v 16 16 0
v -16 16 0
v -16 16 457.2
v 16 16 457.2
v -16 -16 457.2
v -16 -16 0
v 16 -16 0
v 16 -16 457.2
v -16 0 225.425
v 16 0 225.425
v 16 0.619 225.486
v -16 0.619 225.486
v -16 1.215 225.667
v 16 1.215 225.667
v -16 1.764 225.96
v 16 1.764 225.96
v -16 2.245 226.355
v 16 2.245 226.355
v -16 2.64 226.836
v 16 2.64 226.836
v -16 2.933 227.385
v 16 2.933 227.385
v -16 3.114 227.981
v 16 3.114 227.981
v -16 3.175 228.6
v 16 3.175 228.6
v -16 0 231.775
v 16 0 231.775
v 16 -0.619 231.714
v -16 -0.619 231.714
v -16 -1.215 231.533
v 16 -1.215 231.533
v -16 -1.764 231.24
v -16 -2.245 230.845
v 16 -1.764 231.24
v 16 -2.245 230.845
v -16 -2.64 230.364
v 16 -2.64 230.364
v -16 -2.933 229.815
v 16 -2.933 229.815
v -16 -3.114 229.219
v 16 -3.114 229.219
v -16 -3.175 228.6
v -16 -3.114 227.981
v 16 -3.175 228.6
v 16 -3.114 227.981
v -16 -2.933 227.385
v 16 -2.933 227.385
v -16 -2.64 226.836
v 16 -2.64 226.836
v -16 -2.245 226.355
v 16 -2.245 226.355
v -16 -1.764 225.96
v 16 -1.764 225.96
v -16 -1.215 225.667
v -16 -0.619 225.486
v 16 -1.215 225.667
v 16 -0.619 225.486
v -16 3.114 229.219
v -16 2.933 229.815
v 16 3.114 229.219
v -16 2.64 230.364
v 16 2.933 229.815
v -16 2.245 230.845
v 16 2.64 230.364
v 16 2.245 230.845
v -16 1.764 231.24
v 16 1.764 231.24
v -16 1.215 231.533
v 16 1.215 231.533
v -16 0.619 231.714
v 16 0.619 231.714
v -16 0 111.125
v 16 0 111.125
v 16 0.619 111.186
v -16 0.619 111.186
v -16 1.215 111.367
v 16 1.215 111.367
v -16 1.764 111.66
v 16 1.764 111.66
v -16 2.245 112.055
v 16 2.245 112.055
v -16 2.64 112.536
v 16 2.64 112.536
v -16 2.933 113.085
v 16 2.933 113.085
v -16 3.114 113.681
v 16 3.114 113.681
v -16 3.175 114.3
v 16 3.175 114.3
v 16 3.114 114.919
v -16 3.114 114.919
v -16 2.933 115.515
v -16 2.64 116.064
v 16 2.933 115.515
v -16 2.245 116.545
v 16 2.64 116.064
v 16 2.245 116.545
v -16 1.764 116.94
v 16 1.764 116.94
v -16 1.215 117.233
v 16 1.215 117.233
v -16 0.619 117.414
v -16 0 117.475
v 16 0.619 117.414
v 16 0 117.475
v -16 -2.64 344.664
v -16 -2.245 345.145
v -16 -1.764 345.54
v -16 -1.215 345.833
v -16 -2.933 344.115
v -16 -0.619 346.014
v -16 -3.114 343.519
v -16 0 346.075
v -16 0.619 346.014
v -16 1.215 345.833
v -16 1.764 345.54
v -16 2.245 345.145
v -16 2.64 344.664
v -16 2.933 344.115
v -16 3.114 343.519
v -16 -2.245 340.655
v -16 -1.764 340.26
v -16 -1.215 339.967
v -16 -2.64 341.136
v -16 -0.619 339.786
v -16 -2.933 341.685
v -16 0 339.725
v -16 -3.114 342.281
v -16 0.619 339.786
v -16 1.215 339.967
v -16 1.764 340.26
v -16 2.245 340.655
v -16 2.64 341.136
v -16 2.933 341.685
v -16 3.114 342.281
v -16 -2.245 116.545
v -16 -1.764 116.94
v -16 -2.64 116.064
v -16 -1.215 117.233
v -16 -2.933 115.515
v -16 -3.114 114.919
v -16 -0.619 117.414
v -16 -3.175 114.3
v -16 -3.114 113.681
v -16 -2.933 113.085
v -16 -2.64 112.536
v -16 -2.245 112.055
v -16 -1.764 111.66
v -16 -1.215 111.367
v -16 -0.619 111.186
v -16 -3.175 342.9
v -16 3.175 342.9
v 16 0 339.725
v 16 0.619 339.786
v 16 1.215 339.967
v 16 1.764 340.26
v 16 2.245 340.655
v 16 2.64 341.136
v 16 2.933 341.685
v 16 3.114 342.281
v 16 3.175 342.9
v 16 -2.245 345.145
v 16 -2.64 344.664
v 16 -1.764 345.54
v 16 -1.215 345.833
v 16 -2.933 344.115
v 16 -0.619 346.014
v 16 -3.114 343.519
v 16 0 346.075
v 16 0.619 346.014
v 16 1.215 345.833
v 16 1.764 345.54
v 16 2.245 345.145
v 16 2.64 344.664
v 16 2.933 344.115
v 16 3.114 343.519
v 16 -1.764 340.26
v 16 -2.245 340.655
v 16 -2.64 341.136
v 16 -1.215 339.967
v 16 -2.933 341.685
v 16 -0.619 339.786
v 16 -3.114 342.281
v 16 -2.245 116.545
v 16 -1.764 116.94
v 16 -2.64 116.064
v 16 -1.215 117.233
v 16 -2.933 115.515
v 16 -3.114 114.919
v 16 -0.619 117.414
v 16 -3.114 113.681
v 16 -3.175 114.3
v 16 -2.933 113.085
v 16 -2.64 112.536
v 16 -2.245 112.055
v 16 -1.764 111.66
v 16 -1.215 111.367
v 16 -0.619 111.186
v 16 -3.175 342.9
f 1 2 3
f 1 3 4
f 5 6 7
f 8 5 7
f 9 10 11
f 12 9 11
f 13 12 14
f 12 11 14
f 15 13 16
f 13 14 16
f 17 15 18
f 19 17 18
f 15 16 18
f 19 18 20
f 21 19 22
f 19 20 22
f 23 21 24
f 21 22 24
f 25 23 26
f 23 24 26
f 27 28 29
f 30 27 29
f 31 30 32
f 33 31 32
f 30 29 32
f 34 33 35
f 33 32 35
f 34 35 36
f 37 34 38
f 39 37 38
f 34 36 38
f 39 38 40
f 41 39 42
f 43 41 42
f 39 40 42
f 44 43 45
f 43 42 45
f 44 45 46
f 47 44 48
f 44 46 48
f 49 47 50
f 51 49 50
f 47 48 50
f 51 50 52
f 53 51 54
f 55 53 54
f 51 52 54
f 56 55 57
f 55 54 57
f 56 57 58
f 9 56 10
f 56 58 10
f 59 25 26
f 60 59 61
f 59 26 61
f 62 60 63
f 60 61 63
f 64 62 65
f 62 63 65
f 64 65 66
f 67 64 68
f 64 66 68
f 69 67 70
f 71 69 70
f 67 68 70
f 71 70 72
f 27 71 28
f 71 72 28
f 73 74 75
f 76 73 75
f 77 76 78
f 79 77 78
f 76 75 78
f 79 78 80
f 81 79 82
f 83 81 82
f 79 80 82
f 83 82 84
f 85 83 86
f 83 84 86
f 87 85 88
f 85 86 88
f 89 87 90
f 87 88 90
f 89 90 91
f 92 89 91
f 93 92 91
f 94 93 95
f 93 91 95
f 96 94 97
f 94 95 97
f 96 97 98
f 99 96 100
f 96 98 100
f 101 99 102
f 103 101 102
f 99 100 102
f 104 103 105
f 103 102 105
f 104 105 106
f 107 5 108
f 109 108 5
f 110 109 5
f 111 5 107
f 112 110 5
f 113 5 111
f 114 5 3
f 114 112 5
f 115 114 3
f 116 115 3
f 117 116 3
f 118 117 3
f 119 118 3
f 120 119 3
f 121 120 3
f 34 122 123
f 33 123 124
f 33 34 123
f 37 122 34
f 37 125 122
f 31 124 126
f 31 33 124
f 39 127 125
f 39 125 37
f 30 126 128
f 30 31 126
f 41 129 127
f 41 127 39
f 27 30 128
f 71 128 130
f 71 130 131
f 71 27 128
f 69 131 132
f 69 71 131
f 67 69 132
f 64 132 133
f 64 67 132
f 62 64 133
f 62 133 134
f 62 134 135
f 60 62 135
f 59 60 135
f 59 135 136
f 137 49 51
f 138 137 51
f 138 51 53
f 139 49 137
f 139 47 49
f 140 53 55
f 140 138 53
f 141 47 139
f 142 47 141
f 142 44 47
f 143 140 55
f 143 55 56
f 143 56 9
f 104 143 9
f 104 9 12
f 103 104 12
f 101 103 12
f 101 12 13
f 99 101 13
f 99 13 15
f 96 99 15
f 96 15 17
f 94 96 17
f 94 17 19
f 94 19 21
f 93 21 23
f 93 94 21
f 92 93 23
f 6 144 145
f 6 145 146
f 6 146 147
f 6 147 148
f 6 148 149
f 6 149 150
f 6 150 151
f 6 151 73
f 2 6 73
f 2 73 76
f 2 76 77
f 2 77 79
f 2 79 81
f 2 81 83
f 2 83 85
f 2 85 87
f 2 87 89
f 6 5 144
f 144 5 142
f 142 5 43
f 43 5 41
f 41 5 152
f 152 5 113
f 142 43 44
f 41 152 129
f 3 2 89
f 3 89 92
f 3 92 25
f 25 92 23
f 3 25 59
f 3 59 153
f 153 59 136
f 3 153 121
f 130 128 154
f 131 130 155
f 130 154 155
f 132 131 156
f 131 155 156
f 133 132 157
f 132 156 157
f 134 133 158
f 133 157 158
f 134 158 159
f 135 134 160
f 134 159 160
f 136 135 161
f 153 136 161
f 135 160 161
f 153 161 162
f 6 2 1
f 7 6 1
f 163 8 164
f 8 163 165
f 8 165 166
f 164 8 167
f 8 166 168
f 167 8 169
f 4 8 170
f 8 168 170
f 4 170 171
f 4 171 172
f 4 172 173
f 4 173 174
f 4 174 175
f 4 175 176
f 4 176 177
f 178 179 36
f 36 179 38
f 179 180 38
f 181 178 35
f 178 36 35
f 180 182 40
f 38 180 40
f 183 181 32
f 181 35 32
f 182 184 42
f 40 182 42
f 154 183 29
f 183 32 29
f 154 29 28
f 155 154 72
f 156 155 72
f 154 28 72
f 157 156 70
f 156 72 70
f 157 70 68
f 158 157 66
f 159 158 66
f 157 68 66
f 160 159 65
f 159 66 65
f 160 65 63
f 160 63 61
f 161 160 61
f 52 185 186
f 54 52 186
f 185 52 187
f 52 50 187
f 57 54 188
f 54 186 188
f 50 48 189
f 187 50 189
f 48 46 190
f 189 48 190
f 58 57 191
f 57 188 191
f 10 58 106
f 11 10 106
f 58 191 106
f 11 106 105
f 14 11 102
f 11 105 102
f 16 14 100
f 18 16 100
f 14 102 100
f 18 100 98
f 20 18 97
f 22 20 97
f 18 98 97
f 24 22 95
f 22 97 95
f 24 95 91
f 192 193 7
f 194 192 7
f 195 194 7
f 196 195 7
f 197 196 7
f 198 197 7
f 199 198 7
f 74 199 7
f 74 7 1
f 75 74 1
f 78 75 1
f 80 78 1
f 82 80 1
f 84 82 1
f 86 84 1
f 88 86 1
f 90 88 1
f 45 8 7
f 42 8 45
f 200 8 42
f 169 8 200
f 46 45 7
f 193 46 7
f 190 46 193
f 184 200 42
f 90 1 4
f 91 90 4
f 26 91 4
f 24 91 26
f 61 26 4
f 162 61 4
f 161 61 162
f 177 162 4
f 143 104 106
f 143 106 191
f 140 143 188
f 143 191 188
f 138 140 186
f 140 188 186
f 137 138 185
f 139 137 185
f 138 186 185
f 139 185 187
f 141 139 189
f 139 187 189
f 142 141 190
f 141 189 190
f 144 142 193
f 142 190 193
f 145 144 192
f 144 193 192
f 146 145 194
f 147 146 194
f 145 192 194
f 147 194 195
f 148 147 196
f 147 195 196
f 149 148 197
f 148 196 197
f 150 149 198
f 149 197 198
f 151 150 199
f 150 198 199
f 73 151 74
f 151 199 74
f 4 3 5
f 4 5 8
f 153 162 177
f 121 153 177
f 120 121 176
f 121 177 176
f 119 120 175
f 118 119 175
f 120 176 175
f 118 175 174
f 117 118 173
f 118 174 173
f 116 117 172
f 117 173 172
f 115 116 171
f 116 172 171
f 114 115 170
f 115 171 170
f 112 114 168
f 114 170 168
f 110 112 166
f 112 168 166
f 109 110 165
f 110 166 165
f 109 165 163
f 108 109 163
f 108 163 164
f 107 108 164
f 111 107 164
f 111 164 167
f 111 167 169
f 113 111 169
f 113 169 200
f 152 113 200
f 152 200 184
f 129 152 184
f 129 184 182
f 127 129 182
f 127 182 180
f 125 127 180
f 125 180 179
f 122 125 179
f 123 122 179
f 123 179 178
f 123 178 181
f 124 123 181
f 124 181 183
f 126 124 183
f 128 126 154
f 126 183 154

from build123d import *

# Parameters (mm, degrees)
F0_W     = 32
F0_H     = 32
F1_DEPTH = 457.2
F3_DEPTH = 32.001


with BuildPart() as f1:
    # F0 (on Top) → F1 (new body)
    with BuildSketch(Plane.XY):
        Rectangle(F0_W, F0_H)
    extrude(amount=F1_DEPTH)

    # F2 (on face) → F3 (cut, through all)
    with BuildSketch(Plane.YZ.offset(16)):
        with BuildLine():
            ThreePointArc((0, 117.475), (-3.175, 114.3), (0, 111.125))
            Line((0, 111.125), (0, 114.3))
            Line((0, 114.3), (0, 117.475))
        make_face()
        with BuildLine():
            ThreePointArc((3.175, 342.9), (-2.245064, 345.145064), (0, 339.725))
            ThreePointArc((0, 339.725), (2.245064, 340.654936), (3.175, 342.9))
        make_face()
        with BuildLine():
            ThreePointArc((0, 231.775), (-3.175, 228.6), (0, 225.425))
            Line((0, 225.425), (0, 228.6))
            Line((0, 228.6), (0, 231.775))
        make_face()
        with BuildLine():
            Line((0, 228.6), (0, 225.425))
            ThreePointArc((0, 225.425), (2.245064, 226.354936), (3.175, 228.6))
            ThreePointArc((3.175, 228.6), (2.245064, 230.845064), (0, 231.775))
            Line((0, 231.775), (0, 228.6))
        make_face()
        with BuildLine():
            Line((0, 114.3), (0, 111.125))
            ThreePointArc((0, 111.125), (2.245064, 112.054936), (3.175, 114.3))
            ThreePointArc((3.175, 114.3), (2.245064, 116.545064), (0, 117.475))
            Line((0, 117.475), (0, 114.3))
        make_face()
    extrude(amount=-F3_DEPTH, mode=Mode.SUBTRACT)


solid = f1.part
